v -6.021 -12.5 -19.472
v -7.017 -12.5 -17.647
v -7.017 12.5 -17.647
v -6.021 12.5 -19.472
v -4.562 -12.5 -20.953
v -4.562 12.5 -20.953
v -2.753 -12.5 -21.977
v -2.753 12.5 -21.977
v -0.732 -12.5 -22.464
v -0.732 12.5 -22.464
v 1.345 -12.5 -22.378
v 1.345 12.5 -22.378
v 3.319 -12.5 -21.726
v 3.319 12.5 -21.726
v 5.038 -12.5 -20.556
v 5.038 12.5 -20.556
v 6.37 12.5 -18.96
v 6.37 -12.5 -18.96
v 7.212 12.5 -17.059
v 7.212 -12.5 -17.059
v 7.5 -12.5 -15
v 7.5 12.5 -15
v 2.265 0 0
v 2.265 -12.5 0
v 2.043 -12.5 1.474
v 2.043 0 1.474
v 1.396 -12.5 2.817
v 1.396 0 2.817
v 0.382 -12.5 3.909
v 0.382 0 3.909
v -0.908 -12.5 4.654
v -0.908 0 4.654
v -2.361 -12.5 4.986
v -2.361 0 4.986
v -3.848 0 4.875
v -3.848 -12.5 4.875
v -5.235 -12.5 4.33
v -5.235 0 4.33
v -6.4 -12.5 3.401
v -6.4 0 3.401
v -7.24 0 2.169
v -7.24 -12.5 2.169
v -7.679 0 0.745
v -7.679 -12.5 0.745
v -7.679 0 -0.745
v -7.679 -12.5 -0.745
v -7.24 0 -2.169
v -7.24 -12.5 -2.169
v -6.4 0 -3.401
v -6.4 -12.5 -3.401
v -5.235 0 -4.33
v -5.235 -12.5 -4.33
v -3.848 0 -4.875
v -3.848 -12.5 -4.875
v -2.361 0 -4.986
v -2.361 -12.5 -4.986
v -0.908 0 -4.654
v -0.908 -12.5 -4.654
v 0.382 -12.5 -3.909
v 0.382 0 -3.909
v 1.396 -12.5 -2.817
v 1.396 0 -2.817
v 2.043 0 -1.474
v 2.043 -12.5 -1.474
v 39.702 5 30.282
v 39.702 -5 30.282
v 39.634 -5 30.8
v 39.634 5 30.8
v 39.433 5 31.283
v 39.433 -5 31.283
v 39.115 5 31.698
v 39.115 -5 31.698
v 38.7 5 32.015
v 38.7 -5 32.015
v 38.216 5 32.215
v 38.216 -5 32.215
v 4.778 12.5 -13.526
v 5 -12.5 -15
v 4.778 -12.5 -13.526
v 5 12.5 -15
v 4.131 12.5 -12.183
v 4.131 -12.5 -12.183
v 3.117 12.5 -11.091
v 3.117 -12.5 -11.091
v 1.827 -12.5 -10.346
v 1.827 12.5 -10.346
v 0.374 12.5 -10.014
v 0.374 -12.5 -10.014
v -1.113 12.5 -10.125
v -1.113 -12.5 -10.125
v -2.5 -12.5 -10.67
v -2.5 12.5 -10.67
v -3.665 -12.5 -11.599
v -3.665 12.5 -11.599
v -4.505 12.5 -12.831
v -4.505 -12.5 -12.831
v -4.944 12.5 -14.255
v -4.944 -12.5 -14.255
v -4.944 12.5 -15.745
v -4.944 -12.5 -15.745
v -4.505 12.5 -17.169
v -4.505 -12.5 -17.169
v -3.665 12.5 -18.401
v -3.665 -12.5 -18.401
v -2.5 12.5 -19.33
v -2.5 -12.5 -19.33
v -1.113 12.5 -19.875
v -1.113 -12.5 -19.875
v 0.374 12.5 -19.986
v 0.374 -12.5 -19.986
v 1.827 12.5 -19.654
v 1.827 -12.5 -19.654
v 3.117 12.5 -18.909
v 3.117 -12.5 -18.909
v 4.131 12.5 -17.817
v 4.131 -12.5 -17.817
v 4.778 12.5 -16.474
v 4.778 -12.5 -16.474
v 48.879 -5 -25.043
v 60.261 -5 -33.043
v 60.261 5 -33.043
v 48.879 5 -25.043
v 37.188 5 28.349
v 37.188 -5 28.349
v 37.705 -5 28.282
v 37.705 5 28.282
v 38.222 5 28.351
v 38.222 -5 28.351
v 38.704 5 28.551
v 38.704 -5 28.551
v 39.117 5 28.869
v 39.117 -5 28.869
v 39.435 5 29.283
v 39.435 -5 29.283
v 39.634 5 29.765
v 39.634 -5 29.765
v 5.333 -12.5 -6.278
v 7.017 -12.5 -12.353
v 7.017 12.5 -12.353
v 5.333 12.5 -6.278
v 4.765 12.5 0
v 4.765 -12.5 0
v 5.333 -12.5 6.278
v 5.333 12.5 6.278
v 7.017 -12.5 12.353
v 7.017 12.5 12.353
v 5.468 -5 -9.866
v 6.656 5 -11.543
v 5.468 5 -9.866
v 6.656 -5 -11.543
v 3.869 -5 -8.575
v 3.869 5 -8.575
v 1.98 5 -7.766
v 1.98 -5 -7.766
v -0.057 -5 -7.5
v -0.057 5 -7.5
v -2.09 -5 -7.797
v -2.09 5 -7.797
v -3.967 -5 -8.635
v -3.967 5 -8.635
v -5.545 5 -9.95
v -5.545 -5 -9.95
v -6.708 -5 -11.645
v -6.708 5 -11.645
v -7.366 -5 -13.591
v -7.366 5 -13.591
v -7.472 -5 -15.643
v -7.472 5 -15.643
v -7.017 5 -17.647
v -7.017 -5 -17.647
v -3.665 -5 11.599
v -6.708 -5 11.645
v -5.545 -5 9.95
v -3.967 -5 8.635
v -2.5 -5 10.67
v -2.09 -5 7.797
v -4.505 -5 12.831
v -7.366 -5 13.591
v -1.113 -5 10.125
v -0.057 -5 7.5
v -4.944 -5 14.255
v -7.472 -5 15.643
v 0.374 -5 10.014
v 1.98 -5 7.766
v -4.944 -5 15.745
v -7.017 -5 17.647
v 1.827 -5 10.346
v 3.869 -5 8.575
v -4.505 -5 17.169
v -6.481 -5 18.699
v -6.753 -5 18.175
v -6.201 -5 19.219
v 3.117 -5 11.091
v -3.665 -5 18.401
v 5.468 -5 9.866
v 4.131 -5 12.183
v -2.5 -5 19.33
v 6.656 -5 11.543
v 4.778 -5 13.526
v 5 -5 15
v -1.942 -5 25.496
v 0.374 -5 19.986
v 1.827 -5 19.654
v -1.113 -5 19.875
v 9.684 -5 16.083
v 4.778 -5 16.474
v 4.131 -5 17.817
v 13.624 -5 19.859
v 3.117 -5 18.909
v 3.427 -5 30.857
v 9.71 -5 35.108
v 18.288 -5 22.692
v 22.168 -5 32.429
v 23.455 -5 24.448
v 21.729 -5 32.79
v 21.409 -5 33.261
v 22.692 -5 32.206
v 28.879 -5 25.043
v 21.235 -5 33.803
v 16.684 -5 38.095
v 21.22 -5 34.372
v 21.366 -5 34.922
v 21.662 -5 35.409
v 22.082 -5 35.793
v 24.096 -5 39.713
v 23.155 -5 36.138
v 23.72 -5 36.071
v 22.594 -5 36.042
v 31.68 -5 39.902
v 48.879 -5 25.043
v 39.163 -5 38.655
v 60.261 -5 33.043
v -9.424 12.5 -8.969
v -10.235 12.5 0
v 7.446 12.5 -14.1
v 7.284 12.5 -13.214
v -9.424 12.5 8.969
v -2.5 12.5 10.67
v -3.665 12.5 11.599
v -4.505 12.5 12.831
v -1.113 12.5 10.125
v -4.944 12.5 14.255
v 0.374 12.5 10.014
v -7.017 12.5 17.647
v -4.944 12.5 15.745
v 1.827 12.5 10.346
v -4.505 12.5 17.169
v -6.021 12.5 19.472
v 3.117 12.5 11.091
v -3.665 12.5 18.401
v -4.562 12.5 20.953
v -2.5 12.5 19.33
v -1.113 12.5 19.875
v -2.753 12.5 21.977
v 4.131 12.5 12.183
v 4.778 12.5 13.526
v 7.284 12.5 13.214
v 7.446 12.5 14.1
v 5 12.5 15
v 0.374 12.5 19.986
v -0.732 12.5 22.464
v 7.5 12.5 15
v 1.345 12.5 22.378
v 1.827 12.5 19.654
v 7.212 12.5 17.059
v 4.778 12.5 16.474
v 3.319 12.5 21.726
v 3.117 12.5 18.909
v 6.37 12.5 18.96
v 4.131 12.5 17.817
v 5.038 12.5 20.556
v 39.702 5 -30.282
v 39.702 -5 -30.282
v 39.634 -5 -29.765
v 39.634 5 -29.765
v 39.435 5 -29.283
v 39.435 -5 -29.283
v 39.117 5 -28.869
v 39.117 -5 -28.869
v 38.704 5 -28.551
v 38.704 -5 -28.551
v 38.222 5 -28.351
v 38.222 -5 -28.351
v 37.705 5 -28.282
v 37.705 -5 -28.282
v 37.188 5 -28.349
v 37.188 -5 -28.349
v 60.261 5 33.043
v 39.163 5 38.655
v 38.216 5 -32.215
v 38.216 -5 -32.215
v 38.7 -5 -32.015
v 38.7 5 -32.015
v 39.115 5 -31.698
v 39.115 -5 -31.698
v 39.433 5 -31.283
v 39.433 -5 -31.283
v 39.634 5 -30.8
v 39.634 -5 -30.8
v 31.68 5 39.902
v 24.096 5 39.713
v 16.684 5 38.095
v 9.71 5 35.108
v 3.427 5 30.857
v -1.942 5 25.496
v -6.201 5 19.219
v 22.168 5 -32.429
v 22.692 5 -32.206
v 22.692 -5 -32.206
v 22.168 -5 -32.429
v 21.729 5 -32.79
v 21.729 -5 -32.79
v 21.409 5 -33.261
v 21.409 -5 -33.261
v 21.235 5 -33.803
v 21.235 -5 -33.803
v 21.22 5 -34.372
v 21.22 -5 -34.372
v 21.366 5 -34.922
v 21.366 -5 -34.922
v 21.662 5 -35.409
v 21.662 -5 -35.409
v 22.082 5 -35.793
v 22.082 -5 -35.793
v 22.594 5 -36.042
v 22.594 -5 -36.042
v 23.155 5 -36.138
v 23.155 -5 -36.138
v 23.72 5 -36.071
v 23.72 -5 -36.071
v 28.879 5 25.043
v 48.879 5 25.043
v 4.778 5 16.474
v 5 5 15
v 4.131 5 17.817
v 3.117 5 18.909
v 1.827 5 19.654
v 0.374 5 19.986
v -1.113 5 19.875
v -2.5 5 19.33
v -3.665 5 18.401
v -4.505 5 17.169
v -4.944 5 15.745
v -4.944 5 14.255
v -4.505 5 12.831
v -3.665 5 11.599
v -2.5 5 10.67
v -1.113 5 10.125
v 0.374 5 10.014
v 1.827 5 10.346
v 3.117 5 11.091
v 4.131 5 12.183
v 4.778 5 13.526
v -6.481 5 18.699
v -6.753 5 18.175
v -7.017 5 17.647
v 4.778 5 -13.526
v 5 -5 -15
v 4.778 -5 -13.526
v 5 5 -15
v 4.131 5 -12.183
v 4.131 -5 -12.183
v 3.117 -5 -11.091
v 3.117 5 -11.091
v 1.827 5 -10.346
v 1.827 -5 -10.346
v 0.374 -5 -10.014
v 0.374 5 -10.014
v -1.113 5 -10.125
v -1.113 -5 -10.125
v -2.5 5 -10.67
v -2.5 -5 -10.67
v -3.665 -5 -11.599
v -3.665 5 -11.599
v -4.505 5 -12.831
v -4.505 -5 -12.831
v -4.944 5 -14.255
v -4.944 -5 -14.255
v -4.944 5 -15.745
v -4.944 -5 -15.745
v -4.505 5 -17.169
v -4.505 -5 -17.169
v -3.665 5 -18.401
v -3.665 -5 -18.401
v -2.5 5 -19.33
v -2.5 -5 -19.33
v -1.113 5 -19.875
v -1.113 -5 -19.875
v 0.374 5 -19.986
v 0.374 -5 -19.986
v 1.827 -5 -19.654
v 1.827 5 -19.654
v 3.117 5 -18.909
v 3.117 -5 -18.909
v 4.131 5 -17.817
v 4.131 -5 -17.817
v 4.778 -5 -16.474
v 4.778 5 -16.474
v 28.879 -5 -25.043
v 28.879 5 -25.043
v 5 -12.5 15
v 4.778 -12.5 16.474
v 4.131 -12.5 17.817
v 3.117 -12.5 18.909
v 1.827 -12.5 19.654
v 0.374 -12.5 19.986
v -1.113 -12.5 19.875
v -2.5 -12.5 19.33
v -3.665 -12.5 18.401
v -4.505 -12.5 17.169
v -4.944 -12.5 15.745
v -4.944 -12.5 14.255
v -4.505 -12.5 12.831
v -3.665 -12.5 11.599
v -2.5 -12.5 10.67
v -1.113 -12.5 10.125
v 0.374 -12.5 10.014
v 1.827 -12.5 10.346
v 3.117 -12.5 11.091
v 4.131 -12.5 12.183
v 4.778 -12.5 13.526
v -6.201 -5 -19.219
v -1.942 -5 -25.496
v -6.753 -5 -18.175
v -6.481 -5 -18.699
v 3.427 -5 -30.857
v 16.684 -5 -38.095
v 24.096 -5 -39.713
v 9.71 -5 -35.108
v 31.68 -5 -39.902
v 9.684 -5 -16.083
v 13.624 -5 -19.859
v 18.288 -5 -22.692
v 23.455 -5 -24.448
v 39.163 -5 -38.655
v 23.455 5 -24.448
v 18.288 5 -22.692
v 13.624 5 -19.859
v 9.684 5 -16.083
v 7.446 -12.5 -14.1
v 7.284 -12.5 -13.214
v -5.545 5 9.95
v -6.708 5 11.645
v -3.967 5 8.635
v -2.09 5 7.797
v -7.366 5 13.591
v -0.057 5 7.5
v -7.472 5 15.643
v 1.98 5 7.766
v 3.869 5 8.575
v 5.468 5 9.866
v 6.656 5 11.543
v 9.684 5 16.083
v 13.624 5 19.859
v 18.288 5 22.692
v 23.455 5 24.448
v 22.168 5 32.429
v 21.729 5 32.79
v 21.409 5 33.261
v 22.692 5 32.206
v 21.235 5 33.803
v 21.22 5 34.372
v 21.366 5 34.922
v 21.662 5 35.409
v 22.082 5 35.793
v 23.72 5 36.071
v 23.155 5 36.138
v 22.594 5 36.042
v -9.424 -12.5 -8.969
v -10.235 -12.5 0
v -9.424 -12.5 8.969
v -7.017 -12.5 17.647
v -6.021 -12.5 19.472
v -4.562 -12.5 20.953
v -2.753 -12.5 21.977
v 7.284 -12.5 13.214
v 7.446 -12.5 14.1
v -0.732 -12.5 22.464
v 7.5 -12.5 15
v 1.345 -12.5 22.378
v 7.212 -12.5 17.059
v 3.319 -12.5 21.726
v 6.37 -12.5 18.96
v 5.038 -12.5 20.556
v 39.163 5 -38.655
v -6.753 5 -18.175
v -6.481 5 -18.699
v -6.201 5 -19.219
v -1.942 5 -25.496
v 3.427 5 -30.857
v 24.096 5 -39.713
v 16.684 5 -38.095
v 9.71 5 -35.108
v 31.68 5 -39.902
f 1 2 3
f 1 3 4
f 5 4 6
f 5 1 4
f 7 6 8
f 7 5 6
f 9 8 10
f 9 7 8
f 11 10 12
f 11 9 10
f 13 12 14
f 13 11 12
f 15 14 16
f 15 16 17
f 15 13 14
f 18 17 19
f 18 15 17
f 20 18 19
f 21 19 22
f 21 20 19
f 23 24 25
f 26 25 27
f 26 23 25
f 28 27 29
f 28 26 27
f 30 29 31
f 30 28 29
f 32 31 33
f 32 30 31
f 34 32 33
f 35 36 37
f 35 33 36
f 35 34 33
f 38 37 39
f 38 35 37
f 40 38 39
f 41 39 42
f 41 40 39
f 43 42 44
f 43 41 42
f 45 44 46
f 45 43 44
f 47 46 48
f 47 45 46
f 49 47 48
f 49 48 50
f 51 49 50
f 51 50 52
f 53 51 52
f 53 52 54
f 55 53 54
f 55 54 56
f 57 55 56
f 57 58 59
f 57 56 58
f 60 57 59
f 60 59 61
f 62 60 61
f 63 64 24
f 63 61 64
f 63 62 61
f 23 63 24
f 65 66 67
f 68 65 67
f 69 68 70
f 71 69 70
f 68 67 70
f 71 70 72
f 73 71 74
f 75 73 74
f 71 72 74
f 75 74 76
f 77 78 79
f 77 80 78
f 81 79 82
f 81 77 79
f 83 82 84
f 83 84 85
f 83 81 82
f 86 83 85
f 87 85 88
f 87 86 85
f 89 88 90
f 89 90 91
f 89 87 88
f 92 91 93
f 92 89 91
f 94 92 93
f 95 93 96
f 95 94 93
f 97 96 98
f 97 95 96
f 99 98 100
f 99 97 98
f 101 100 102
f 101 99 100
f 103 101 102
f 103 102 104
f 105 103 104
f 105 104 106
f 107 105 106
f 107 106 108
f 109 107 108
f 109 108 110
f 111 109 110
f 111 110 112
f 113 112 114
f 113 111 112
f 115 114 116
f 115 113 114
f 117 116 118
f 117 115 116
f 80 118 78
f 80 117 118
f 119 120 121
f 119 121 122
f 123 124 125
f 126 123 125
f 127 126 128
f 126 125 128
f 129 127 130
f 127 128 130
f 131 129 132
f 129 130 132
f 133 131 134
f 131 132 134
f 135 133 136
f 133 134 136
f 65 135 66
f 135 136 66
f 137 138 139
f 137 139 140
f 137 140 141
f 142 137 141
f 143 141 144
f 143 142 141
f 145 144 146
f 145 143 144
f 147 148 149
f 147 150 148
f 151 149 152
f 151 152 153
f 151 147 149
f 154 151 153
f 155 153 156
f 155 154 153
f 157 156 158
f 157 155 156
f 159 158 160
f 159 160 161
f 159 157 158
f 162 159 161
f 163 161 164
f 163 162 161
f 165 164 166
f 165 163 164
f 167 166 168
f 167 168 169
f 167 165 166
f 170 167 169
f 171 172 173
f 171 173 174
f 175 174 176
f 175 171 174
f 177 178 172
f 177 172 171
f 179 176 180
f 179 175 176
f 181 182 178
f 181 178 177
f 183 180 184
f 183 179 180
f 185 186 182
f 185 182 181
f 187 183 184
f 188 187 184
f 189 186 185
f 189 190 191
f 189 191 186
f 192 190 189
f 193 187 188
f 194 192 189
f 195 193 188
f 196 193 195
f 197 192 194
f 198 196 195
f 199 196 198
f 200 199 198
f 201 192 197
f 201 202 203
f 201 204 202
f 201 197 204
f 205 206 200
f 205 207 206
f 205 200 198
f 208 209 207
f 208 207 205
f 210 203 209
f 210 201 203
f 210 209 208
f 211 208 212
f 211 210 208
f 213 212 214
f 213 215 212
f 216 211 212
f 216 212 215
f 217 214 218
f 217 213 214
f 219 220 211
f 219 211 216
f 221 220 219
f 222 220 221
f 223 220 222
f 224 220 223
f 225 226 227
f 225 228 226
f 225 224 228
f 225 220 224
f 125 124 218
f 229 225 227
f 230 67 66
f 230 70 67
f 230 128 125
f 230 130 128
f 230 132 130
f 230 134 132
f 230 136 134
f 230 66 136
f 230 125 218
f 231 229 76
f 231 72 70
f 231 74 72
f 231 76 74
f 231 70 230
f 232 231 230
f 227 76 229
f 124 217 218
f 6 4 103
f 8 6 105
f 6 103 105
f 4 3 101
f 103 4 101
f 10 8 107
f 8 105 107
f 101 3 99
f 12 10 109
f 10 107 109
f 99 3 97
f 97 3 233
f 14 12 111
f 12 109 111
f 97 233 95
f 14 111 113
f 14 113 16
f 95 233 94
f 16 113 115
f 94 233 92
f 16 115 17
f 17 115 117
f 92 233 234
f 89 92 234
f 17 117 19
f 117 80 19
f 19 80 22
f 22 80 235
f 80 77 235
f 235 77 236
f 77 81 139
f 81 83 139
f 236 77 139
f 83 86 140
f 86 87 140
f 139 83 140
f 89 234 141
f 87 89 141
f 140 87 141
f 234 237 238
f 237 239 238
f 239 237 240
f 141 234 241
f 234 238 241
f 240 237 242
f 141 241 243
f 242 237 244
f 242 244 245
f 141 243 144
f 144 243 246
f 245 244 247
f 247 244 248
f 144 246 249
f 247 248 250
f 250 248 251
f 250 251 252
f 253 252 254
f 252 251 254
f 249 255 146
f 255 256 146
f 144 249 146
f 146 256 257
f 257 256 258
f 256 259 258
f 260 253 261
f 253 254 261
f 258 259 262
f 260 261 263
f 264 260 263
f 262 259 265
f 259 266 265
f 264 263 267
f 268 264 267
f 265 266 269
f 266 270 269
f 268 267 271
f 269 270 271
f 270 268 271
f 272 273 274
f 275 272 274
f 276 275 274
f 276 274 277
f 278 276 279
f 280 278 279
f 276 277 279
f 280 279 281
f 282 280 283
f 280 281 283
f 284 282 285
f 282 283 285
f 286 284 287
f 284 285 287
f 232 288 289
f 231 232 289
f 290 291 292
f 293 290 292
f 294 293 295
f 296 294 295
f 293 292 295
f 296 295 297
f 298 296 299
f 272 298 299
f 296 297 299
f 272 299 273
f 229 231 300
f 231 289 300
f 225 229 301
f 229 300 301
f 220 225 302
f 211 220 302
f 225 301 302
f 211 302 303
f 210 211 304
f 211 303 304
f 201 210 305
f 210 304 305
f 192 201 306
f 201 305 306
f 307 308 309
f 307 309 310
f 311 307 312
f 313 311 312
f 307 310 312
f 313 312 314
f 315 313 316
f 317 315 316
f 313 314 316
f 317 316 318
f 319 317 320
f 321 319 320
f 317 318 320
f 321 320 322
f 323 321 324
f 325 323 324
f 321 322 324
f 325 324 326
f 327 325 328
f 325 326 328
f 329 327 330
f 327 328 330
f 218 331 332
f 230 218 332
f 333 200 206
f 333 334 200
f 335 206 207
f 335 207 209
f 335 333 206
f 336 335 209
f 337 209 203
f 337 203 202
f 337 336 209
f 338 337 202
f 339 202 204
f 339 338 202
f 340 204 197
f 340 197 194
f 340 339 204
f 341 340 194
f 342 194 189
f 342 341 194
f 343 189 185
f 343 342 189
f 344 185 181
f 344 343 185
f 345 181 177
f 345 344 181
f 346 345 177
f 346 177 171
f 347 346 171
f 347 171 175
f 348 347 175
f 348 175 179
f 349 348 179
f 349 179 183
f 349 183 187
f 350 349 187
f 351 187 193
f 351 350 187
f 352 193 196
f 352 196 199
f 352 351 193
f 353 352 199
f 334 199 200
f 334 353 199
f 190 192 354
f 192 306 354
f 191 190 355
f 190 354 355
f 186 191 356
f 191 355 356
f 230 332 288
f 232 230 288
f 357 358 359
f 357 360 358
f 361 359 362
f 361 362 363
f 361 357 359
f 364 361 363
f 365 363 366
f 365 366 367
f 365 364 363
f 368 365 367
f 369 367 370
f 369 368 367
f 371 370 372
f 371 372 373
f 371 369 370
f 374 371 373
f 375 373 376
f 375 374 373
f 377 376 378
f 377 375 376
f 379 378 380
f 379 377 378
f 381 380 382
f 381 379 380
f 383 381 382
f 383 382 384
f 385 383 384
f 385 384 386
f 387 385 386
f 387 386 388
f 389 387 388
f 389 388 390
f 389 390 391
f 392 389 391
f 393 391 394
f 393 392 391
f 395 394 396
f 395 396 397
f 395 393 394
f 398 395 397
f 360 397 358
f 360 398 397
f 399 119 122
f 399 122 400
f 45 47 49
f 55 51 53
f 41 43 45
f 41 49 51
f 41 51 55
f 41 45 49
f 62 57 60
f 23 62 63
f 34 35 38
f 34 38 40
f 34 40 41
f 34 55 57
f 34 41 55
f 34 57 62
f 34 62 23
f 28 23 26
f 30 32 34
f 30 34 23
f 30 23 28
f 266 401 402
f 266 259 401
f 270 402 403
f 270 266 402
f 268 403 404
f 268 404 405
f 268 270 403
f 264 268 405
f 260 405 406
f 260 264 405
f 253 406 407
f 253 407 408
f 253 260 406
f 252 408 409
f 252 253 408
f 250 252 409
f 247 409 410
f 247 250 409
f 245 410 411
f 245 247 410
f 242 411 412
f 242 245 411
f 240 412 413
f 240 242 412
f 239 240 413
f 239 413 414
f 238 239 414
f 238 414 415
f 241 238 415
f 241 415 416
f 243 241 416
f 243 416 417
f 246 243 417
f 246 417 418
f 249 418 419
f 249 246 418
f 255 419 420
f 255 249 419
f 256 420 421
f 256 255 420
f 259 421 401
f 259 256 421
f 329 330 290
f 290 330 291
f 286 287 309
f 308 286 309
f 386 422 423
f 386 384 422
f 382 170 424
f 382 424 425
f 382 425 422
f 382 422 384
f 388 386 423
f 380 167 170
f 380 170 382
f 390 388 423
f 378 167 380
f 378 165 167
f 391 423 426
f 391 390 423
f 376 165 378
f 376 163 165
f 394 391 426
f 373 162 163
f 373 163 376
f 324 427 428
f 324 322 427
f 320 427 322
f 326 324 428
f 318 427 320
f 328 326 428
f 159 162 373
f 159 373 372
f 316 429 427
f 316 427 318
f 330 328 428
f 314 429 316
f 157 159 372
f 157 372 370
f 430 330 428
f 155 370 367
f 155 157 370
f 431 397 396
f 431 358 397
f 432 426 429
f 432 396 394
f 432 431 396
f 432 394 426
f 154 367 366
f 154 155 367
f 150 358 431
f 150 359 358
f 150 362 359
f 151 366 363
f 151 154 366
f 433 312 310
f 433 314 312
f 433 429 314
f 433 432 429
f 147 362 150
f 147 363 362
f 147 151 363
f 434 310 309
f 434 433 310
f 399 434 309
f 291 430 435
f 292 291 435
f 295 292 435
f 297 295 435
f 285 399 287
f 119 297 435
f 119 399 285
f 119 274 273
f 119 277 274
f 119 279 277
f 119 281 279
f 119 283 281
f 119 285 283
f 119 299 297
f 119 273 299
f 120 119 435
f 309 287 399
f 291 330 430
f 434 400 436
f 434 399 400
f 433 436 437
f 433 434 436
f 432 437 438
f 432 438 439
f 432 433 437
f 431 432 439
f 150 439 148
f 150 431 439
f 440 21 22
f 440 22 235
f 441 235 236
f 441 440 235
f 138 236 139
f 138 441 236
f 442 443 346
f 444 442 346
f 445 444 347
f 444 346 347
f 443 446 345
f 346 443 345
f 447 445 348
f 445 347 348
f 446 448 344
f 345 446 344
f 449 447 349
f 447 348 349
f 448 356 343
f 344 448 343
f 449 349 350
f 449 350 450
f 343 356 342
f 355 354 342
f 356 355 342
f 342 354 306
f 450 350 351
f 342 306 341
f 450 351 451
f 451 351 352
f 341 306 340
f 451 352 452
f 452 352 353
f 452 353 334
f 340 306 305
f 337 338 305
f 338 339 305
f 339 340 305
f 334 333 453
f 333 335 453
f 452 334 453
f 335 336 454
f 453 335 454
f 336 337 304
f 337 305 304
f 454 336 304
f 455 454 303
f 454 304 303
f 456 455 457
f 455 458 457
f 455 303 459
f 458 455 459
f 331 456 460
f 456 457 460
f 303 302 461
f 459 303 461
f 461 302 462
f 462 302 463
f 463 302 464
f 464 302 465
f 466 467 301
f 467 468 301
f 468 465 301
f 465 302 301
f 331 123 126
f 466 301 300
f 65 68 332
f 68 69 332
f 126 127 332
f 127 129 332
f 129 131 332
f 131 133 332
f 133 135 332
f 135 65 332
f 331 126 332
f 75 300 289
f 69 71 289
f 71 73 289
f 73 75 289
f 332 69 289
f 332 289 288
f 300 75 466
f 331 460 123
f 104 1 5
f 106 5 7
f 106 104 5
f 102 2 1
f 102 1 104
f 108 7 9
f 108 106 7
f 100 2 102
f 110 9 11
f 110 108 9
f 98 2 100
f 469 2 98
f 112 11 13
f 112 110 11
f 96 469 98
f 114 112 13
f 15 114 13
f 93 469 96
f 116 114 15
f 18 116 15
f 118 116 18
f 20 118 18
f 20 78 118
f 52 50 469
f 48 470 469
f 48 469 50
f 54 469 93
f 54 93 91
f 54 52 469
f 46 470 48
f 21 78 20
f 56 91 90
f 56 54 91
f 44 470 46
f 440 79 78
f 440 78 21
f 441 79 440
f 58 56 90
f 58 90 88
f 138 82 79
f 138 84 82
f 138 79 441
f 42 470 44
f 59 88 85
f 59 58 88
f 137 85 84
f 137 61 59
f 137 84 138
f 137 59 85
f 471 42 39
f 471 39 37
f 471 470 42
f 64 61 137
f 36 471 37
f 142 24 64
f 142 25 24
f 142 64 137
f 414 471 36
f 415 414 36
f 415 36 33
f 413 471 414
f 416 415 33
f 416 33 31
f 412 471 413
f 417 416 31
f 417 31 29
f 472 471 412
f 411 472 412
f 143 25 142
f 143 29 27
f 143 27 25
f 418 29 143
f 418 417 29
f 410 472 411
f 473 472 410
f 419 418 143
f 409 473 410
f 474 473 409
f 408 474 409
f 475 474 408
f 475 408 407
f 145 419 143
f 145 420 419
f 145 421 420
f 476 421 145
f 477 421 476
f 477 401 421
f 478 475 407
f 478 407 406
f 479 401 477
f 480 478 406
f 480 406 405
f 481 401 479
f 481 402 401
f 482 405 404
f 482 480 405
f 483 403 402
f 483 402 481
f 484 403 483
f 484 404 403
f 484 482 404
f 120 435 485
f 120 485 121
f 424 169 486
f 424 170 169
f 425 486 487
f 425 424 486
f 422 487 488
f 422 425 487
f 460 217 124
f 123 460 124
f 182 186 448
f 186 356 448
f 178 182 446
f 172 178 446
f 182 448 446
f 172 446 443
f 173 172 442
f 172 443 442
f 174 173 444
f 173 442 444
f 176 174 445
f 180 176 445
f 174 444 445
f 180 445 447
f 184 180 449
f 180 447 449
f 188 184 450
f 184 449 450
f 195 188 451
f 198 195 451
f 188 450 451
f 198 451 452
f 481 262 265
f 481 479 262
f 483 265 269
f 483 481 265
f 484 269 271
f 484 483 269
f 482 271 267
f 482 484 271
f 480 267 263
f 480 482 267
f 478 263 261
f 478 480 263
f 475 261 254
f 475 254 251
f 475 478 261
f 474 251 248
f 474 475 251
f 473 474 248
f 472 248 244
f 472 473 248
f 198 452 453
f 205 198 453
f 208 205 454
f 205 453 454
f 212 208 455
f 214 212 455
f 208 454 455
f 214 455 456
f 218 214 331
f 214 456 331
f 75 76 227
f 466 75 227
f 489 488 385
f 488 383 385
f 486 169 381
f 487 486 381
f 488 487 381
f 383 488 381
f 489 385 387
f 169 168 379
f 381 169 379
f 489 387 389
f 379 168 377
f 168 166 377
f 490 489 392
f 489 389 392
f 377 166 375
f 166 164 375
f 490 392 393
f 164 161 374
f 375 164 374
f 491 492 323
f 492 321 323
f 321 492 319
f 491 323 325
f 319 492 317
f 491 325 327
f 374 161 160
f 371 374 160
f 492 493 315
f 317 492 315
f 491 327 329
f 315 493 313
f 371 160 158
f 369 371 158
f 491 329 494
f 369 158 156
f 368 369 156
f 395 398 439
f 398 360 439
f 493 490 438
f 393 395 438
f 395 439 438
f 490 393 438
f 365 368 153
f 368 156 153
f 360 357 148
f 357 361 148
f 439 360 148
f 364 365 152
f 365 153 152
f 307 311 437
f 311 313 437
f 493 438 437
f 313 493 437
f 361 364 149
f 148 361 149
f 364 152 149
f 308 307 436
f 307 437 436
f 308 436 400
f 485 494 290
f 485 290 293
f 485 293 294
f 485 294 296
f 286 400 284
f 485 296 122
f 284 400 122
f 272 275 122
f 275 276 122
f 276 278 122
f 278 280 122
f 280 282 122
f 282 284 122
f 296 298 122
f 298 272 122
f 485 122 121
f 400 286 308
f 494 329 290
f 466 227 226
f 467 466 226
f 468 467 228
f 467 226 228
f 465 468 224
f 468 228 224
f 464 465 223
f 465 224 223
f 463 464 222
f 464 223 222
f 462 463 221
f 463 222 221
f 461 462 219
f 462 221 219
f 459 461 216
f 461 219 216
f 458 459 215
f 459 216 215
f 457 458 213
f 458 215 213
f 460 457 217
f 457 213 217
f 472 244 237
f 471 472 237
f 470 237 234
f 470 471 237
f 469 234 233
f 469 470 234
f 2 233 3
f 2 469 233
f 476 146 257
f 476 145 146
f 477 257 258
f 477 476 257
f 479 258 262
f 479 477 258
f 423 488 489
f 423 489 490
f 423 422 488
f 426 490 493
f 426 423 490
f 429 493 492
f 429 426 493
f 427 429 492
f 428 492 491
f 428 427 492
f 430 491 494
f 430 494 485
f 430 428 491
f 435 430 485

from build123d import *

# Parameters (mm, degrees)
F0_R     = 5
F2_DEPTH = 12.5
F1_R     = 5
F3_DEPTH = 5
F5_DEPTH = 17.501
F6_R     = 5
F7_DEPTH = 12.501


with BuildPart() as f2:
    # F0 (on Front) → F2 (new body, symmetric)
    with BuildSketch(Plane.XZ):
        with BuildLine():
            ThreePointArc((7.017341, 12.352941), (-2.647059, 7.982659), (-7.017341, 17.647059))
            ThreePointArc((-7.017341, 17.647059), (-10.235066, 0), (-7.017341, -17.647059))
            ThreePointArc((-7.017341, -17.647059), (-2.647059, -7.982659), (7.017341, -12.352941))
            ThreePointArc((7.017341, -12.352941), (4.764934, 0), (7.017341, 12.352941))
        make_face()
        with BuildLine():
            ThreePointArc((7.017341, 12.352941), (7.378349, 13.654649), (7.5, 15))
            ThreePointArc((7.5, 15), (1.345351, 22.378349), (-7.017341, 17.647059))
            ThreePointArc((-7.017341, 17.647059), (-2.647059, 7.982659), (7.017341, 12.352941))
        make_face()
        with Locations((0, 15)):
            Circle(F0_R, mode=Mode.SUBTRACT)
        with BuildLine():
            ThreePointArc((7.017341, -12.352941), (-2.647059, -7.982659), (-7.017341, -17.647059))
            ThreePointArc((-7.017341, -17.647059), (1.345351, -22.378349), (7.5, -15))
            ThreePointArc((7.5, -15), (7.378349, -13.654649), (7.017341, -12.352941))
        make_face()
        with Locations((0, -15)):
            Circle(F0_R, mode=Mode.SUBTRACT)
    extrude(amount=F2_DEPTH, both=True)

    # F6 (on Front) → F7 (cut, through all)
    with BuildSketch(Plane.XZ):
        with Locations((-2.735066, 0)):
            Circle(F6_R)
    extrude(amount=F7_DEPTH, mode=Mode.SUBTRACT)


with BuildPart() as f3:
    # F1 (on Front) → F3 (new body, symmetric)
    with BuildSketch(Plane.XZ):
        with BuildLine():
            Line((60.2613, 33.042649), (39.163152, 38.655478))
            ThreePointArc((39.163152, 38.655478), (13.126079, 36.767248), (-6.201086, 19.218593))
            ThreePointArc((-6.201086, 19.218593), (-6.617912, 18.437344), (-7.017341, 17.647059))
            ThreePointArc((-7.017341, 17.647059), (-3.05738, 8.151465), (6.65576, 11.542998))
            ThreePointArc((6.65576, 11.542998), (15.878185, 21.403288), (28.879473, 25.042649))
            Line((28.879473, 25.042649), (48.879473, 25.042649))
            Line((48.879473, 25.042649), (60.2613, 33.042649))
        make_face()
        with Locations((0, 15)):
            Circle(F1_R, mode=Mode.SUBTRACT)
        with BuildLine():
            ThreePointArc((-6.201086, -19.218593), (13.126079, -36.767248), (39.163152, -38.655478))
            Line((39.163152, -38.655478), (60.2613, -33.042649))
            Line((60.2613, -33.042649), (48.879473, -25.042649))
            Line((48.879473, -25.042649), (28.879473, -25.042649))
            ThreePointArc((28.879473, -25.042649), (15.878185, -21.403288), (6.65576, -11.542998))
            ThreePointArc((6.65576, -11.542998), (-3.05738, -8.151465), (-7.017341, -17.647059))
            ThreePointArc((-7.017341, -17.647059), (-6.617912, -18.437344), (-6.201086, -19.218593))
        make_face()
        with Locations((0, -15)):
            Circle(F1_R, mode=Mode.SUBTRACT)
    extrude(amount=F3_DEPTH, both=True)

    # F4 (on face) → F5 (cut, through all)
    with BuildSketch(Plane.XZ.offset(5)):
        with BuildLine():
            ThreePointArc((22.692121, 32.205592), (24.425245, 32.552748), (25.206305, 34.138366))
            ThreePointArc((25.206305, 34.138366), (24.791923, 35.357307), (23.720489, 36.07114))
            ThreePointArc((23.720489, 36.07114), (21.273531, 34.65255), (22.692121, 32.205592))
        make_face()
        with BuildLine():
            ThreePointArc((23.720489, 36.07114), (24.791923, 35.357307), (25.206305, 34.138366))
            ThreePointArc((25.206305, 34.138366), (24.425245, 32.552748), (22.692121, 32.205592))
            Line((22.692121, 32.205592), (37.187925, 28.349213))
            ThreePointArc((37.187925, 28.349213), (35.769335, 30.796171), (38.216293, 32.21476))
            Line((38.216293, 32.21476), (23.720489, 36.07114))
        make_face()
        with BuildLine():
            ThreePointArc((39.702109, 30.281987), (39.287727, 31.500927), (38.216293, 32.21476))
            ThreePointArc((38.216293, 32.21476), (35.769335, 30.796171), (37.187925, 28.349213))
            ThreePointArc((37.187925, 28.349213), (38.921049, 28.696369), (39.702109, 30.281987))
        make_face()
        with BuildLine():
            ThreePointArc((23.720489, -36.07114), (24.791923, -35.357307), (25.206305, -34.138366))
            ThreePointArc((25.206305, -34.138366), (24.425245, -32.552748), (22.692121, -32.205592))
            ThreePointArc((22.692121, -32.205592), (21.273531, -34.65255), (23.720489, -36.07114))
        make_face()
        with BuildLine():
            ThreePointArc((22.692121, -32.205592), (24.425245, -32.552748), (25.206305, -34.138366))
            ThreePointArc((25.206305, -34.138366), (24.791923, -35.357307), (23.720489, -36.07114))
            Line((23.720489, -36.07114), (38.216293, -32.21476))
            ThreePointArc((38.216293, -32.21476), (35.769335, -30.796171), (37.187925, -28.349213))
            Line((37.187925, -28.349213), (22.692121, -32.205592))
        make_face()
        with BuildLine():
            ThreePointArc((39.702109, -30.281987), (38.921049, -28.696369), (37.187925, -28.349213))
            ThreePointArc((37.187925, -28.349213), (35.769335, -30.796171), (38.216293, -32.21476))
            ThreePointArc((38.216293, -32.21476), (39.287727, -31.500927), (39.702109, -30.281987))
        make_face()
    extrude(amount=-F5_DEPTH, mode=Mode.SUBTRACT)


solid = Compound([f2.part, f3.part])
